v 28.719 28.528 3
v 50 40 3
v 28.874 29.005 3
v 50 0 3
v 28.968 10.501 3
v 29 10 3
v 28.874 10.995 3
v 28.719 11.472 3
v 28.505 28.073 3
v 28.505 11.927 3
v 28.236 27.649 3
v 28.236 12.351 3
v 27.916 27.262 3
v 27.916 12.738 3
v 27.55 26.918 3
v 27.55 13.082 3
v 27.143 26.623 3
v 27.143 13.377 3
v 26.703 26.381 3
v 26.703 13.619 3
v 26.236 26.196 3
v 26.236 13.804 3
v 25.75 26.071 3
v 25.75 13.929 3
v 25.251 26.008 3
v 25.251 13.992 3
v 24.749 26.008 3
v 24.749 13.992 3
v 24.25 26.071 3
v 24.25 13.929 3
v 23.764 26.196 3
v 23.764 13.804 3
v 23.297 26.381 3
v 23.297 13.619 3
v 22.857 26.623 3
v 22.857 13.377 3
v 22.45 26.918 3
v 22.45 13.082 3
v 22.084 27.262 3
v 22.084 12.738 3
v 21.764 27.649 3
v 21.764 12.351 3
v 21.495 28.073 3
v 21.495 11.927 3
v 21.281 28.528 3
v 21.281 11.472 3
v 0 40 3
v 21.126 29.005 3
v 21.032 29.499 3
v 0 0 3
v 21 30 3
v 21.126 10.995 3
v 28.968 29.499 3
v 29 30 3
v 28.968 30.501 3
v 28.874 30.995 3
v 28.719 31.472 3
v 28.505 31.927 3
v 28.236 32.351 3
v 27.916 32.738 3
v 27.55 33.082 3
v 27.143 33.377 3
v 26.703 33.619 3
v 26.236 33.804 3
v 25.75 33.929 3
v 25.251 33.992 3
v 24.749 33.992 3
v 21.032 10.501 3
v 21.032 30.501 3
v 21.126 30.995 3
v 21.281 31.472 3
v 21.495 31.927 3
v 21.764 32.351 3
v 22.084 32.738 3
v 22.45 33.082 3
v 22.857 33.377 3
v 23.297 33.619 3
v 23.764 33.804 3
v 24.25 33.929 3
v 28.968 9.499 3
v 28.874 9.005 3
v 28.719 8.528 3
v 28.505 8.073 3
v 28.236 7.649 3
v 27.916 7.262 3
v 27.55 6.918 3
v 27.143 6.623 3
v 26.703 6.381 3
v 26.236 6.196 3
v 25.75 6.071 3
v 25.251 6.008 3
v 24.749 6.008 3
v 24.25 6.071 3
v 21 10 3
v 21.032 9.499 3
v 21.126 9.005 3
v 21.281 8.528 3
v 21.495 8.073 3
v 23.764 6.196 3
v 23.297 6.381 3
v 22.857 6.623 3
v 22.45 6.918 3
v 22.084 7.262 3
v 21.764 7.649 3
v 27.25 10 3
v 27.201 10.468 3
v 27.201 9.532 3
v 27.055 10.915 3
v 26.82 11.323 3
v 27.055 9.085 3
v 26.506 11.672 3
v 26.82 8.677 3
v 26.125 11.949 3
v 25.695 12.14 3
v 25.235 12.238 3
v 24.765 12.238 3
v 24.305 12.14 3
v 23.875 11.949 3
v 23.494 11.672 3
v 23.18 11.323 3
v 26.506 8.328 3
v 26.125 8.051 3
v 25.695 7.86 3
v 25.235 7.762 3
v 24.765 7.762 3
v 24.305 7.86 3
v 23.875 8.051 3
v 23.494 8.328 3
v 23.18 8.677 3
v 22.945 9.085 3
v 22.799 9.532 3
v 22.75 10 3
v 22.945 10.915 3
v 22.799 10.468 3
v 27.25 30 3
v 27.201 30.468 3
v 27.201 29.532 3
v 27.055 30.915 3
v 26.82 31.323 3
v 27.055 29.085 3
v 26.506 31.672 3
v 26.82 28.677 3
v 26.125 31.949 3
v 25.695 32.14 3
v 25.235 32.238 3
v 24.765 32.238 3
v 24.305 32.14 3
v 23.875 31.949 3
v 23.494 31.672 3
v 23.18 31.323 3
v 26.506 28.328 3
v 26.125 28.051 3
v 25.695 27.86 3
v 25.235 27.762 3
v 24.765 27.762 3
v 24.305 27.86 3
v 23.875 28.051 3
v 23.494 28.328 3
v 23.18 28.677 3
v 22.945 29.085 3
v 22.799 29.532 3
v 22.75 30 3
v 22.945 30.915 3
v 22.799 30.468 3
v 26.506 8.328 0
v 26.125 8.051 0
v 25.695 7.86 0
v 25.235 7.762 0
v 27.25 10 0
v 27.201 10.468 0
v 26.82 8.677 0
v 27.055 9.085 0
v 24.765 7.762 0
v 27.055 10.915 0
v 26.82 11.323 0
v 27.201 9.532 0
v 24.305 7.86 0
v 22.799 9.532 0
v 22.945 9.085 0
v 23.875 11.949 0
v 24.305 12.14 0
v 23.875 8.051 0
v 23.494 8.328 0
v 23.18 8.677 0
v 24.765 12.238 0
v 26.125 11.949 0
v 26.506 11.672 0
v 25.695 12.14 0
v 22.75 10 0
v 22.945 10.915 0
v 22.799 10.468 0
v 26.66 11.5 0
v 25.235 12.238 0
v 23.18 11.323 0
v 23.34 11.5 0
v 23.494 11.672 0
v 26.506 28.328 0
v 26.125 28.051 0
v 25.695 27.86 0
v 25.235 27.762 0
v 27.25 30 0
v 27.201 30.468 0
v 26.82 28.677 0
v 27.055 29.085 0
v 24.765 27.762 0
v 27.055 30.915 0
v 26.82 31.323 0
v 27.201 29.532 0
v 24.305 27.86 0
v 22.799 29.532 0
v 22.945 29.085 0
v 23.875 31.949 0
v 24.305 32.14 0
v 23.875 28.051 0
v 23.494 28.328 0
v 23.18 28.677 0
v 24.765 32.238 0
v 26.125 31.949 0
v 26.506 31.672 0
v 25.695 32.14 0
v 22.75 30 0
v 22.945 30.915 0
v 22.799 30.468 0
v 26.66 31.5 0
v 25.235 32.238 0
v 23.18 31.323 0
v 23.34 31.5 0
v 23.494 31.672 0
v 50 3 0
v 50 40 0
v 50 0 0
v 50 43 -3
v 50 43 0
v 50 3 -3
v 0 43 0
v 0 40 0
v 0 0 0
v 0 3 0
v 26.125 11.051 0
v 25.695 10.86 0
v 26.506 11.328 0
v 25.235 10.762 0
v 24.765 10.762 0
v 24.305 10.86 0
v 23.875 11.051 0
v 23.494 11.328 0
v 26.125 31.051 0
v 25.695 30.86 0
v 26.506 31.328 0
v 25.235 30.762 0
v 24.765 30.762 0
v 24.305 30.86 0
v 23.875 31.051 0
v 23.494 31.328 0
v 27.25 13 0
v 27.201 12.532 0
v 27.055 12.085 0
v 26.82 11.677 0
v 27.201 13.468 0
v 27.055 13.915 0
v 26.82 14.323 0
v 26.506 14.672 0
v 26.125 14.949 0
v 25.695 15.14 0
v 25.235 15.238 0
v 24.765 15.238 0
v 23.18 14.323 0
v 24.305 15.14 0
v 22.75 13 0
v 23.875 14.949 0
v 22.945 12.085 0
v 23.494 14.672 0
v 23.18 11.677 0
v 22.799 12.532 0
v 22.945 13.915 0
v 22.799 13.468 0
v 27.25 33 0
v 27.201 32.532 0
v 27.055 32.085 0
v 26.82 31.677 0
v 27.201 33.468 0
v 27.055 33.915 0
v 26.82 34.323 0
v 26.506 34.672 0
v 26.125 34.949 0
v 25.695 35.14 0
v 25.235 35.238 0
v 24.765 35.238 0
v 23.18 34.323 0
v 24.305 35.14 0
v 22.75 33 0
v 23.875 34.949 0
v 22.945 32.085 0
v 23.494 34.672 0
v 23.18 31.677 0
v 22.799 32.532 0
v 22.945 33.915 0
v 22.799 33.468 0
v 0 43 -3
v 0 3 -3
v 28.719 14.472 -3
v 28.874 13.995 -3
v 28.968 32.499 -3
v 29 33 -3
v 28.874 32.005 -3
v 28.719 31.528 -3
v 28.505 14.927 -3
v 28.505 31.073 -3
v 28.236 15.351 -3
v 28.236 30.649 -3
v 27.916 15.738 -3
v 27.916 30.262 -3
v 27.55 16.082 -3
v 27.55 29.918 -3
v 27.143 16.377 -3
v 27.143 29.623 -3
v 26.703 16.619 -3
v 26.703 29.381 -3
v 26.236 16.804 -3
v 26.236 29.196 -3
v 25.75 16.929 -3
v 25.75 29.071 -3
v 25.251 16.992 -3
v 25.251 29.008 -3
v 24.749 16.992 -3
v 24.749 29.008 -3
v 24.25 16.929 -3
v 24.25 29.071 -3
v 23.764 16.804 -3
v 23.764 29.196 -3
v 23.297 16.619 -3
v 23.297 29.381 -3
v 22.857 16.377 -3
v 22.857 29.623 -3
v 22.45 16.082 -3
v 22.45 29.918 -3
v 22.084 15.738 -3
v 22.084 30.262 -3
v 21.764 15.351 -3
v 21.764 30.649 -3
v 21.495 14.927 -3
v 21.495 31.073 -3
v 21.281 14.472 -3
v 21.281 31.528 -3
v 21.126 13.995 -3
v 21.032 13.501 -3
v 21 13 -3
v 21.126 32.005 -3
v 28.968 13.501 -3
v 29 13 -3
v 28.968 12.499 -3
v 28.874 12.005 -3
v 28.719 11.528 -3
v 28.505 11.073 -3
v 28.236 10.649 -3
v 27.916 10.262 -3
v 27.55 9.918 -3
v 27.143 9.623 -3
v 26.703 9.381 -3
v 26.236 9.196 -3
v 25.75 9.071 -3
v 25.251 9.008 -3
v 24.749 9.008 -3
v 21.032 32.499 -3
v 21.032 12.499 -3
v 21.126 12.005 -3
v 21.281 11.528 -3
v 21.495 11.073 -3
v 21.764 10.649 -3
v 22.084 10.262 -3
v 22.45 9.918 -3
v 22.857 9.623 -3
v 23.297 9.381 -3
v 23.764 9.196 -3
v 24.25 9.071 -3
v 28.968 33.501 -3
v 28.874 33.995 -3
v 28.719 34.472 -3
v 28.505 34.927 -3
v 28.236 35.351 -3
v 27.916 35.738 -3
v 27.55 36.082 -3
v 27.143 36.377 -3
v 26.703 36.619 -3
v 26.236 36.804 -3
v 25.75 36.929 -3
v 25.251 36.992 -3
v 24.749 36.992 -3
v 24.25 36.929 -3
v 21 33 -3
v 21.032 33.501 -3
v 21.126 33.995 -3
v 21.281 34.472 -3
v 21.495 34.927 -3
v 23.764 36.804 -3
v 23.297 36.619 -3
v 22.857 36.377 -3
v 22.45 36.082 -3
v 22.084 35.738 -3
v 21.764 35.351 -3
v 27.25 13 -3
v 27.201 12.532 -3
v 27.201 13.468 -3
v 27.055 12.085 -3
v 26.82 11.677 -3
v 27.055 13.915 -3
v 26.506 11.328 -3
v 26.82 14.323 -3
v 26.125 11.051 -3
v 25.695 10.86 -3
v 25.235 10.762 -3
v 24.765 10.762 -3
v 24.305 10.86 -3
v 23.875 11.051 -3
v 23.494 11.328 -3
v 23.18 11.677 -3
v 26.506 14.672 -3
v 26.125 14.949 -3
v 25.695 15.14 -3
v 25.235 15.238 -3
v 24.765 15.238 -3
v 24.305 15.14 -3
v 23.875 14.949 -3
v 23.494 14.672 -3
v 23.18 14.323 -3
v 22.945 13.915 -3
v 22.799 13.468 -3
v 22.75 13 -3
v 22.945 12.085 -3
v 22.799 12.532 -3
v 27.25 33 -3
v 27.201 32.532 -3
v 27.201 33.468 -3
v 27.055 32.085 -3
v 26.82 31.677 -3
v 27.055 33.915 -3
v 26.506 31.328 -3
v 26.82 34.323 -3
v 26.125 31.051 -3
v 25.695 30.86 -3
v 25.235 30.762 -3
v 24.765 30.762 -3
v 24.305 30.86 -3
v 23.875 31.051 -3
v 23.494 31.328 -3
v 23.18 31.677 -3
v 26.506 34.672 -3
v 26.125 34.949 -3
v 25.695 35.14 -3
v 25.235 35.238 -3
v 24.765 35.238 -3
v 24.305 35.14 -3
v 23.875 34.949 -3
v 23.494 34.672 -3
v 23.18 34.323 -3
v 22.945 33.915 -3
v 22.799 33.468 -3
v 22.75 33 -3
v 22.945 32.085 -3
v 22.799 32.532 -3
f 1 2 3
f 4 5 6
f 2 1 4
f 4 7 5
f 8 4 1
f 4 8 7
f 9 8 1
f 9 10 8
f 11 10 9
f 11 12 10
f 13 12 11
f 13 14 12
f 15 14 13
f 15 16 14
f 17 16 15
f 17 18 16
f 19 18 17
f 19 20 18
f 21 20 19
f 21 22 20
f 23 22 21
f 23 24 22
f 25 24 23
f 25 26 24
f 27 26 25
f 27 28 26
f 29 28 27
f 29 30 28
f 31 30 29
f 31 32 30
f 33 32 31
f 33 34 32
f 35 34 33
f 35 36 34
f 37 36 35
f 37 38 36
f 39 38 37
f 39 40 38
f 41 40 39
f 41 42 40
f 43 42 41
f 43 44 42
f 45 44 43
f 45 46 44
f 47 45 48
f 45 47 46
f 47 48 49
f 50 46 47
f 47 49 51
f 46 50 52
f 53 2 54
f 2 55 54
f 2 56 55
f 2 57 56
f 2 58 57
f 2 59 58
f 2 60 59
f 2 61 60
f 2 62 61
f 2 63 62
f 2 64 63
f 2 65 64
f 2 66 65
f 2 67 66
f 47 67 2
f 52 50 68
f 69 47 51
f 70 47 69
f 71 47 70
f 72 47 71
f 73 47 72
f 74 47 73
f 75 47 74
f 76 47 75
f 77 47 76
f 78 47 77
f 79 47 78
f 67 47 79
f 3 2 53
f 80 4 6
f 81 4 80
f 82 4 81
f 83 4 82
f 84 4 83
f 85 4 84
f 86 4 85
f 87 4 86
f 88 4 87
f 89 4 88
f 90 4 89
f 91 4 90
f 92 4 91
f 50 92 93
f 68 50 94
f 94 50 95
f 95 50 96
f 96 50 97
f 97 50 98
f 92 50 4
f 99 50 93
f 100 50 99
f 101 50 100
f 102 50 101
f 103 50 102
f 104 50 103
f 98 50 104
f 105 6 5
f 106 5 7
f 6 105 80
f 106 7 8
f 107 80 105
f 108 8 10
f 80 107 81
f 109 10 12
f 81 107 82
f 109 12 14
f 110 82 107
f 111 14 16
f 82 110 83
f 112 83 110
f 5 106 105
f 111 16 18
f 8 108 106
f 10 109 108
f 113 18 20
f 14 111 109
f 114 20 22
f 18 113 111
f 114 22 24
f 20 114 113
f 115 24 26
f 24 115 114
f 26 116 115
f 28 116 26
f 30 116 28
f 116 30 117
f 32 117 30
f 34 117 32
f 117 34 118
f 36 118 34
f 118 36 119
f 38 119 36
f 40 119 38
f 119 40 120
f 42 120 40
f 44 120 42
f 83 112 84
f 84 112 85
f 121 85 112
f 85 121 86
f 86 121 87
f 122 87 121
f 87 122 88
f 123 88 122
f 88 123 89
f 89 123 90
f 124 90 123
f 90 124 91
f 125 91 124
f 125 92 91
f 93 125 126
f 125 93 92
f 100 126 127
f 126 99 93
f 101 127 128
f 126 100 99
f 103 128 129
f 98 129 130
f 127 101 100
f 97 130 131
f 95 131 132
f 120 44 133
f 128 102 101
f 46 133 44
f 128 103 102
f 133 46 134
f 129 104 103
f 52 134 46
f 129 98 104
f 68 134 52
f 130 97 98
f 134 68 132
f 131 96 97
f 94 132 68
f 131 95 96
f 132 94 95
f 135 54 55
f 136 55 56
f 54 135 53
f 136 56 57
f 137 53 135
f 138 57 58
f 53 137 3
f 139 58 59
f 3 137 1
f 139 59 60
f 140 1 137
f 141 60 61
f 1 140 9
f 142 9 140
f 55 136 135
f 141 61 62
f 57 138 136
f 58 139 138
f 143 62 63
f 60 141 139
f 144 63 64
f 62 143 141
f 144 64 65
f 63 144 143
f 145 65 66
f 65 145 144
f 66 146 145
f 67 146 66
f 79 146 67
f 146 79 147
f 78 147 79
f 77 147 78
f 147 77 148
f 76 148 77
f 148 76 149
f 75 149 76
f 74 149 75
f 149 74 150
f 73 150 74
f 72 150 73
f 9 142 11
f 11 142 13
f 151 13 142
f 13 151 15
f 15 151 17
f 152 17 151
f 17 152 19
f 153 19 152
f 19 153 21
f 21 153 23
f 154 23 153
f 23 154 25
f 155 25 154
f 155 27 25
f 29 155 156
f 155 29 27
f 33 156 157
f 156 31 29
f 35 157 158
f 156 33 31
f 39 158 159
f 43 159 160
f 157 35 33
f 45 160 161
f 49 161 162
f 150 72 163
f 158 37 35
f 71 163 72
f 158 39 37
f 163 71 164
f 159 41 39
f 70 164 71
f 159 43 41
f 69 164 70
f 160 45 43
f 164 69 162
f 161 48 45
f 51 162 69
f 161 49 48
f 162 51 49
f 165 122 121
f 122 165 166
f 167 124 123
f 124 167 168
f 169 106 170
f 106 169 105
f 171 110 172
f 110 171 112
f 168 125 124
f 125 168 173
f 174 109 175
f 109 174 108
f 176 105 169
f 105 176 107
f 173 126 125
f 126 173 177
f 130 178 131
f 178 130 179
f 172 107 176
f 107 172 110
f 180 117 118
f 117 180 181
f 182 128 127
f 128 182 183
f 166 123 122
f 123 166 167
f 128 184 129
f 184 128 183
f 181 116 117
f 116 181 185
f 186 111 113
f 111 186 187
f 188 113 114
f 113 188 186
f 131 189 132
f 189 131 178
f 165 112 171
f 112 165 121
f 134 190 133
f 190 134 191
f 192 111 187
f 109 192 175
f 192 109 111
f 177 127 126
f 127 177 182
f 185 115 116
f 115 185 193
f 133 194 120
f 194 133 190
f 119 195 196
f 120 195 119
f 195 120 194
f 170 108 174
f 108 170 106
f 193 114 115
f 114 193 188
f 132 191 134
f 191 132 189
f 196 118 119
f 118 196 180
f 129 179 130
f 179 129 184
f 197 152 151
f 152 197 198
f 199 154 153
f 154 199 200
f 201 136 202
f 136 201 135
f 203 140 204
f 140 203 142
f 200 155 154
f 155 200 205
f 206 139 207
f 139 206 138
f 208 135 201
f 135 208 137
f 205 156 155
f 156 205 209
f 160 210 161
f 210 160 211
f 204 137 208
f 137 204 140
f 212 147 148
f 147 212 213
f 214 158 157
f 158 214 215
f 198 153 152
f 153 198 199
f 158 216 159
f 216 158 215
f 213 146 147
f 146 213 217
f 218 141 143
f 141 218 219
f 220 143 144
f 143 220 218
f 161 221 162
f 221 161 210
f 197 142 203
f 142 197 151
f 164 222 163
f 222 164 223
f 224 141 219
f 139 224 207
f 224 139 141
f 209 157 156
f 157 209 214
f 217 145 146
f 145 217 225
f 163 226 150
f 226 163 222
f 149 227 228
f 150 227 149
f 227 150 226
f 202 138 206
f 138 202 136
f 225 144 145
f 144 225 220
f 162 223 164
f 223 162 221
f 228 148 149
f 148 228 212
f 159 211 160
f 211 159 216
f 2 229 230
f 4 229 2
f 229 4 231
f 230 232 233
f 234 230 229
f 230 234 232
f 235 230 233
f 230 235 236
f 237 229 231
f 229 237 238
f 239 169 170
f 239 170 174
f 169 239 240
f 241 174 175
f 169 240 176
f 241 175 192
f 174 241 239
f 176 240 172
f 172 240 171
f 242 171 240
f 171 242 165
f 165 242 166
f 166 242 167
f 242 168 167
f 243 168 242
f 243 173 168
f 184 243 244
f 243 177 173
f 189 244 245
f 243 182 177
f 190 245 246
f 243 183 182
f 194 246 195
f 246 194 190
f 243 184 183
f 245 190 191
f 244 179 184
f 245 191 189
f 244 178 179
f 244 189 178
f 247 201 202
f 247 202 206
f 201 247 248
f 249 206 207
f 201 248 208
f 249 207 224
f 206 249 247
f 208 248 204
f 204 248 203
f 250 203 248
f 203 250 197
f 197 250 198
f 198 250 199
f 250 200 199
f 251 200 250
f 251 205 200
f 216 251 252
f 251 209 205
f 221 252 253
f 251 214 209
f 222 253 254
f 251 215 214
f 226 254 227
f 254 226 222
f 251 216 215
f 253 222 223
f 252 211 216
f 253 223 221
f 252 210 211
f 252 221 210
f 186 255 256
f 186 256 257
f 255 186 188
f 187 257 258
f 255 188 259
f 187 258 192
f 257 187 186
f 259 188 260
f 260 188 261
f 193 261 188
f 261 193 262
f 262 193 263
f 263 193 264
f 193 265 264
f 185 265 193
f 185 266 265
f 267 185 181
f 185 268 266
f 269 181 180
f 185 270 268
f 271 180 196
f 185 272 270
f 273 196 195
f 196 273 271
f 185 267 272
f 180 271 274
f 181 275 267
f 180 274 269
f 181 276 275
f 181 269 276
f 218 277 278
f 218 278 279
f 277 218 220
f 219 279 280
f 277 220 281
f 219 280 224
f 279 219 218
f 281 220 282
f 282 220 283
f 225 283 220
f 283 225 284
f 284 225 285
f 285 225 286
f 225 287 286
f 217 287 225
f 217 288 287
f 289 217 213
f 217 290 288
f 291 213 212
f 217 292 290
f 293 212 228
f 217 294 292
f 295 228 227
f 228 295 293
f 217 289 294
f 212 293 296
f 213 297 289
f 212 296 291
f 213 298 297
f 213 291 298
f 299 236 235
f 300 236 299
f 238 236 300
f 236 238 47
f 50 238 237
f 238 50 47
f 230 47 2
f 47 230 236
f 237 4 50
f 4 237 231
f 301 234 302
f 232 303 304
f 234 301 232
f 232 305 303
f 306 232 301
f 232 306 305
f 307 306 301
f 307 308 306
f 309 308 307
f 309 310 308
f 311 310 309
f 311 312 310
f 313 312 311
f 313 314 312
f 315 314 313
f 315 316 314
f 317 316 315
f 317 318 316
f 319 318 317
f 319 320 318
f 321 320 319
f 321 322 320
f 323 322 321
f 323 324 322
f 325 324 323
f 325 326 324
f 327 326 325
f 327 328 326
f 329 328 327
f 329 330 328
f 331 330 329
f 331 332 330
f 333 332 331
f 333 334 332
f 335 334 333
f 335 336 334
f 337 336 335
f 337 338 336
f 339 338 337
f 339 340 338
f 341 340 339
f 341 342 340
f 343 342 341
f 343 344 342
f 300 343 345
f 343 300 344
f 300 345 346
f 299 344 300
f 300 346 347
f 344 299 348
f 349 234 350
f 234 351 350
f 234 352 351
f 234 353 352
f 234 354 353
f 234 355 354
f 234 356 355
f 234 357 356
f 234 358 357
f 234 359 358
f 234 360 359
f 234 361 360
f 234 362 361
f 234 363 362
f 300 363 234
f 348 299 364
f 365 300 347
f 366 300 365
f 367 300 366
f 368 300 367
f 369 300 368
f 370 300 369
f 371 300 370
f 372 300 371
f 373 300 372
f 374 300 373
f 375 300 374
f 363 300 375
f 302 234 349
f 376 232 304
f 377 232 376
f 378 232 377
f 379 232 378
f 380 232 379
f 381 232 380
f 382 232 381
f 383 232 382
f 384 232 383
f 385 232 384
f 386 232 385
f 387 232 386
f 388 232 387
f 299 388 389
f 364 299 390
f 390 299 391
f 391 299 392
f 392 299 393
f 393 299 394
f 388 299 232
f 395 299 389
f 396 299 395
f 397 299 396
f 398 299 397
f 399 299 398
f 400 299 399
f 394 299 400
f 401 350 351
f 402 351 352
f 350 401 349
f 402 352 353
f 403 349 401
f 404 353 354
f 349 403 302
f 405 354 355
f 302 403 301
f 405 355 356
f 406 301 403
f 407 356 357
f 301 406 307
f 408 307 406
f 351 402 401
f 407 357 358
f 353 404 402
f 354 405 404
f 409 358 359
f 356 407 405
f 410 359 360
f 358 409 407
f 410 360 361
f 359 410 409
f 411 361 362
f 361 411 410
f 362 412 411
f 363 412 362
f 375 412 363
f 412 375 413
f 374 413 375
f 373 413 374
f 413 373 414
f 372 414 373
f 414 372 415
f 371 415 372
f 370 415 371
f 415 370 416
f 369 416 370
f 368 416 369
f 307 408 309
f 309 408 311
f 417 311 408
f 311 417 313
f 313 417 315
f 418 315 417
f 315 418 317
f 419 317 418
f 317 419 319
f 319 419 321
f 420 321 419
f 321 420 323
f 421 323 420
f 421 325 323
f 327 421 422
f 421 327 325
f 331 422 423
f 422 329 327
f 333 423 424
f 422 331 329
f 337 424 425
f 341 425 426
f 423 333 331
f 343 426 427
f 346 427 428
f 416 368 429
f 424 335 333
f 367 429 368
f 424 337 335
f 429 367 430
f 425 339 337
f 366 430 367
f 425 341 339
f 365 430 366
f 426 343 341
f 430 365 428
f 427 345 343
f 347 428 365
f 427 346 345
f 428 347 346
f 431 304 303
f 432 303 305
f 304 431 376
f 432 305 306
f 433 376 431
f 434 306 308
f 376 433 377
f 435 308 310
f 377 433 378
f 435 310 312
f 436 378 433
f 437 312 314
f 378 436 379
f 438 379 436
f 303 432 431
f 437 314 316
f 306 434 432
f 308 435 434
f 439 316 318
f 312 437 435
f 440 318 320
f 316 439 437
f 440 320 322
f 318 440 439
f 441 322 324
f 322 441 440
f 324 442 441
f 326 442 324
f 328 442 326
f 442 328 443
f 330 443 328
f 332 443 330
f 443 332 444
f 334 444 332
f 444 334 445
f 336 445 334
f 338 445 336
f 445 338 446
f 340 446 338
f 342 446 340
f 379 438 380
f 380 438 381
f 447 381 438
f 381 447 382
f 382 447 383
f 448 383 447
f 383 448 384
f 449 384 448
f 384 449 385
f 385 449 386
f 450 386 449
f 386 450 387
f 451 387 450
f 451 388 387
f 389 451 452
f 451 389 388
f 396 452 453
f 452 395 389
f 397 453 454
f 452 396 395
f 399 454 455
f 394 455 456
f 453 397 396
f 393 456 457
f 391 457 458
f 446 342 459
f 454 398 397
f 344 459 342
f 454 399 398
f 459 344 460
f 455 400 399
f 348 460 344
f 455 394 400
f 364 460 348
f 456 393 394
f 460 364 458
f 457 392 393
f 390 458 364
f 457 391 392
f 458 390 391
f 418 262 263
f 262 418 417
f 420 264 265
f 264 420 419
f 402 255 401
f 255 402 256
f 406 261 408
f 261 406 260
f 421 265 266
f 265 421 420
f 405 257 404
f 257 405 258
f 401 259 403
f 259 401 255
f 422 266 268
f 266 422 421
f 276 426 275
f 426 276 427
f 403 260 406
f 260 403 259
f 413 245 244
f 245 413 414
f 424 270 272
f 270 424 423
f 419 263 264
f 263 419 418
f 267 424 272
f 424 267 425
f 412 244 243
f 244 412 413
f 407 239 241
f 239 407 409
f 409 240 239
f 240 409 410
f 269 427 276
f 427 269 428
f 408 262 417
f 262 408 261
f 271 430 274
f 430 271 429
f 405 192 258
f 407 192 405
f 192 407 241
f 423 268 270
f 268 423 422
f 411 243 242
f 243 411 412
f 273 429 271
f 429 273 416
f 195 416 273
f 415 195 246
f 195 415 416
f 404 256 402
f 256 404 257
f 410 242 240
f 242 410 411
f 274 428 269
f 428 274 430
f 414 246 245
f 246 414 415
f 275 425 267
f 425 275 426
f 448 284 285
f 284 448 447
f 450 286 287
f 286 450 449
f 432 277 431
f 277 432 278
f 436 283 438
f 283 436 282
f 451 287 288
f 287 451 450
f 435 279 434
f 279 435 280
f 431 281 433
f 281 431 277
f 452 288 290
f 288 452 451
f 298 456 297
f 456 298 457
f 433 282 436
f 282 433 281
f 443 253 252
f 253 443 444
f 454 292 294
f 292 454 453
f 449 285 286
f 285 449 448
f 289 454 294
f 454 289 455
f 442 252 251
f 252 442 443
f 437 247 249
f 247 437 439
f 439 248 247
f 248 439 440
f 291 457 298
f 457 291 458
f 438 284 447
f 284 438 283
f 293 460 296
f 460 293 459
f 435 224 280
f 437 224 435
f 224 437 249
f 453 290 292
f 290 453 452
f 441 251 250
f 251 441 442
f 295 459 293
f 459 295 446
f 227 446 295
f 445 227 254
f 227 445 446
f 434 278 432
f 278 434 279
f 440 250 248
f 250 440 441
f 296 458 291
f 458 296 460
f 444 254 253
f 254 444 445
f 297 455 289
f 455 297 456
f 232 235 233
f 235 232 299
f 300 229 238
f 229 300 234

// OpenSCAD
// L字ブラケット(L-bracket) OpenSCAD コード

// パラメータ
width = 50;   // フランジ幅 [mm]
depth = 40;   // 水平フランジ奥行 or 垂直フランジ高さ [mm]
thickness = 3; // 板厚 [mm]

hole_d = 4.5;    // M4用穴径 [mm]
csk_d = 8;       // 皿座面径 [mm]
csk_depth = 2;   // 皿座面深さ [mm]
edge_offset = 10; // フランジ縁から皿穴中心までの距離 [mm]

// 皿穴位置: フランジ中心線上で左右対称
hole_y = [edge_offset, depth - edge_offset];
hole_x = width / 2;

// モジュール：M4用皿穴（外側から掘る）
module countersunk_hole() {
    // 皿座面
    translate([0,0,-csk_depth])
        cylinder(h=csk_depth, d=csk_d, $fn=50);
    // 貫通穴
    cylinder(h=thickness+0.1, d=hole_d, $fn=30);
}

// モジュール: 水平面
module horizontal_flange() {
    difference() {
        // 基本板
        cube([width, depth, thickness]);
        // 皿穴: Y方向(奥行き)の2箇所
        for (y_pos = hole_y)
            translate([hole_x, y_pos, thickness])
                // 水平方向の面は上から(外側)に座掘り
                rotate([180,0,0])
                    countersunk_hole();
    }
}

// モジュール: 垂直面
module vertical_flange() {
    difference() {
        // 基本板
        cube([width, thickness, depth]);
        // 皿穴: Z方向(高さ)の2箇所
        for (z_pos = hole_y)
            translate([hole_x, thickness, z_pos])
                // 垂直面の外側はY+方向
                rotate([90,0,0])
                    countersunk_hole();
    }
}

// 組み立て: 原点が内側コーナー
horizontal_flange();
// 垂直面は Z方向へ、Y方向に厚み分だけずらす
translate([0, thickness, 0])
    rotate([-90,0,0])
        vertical_flange();
